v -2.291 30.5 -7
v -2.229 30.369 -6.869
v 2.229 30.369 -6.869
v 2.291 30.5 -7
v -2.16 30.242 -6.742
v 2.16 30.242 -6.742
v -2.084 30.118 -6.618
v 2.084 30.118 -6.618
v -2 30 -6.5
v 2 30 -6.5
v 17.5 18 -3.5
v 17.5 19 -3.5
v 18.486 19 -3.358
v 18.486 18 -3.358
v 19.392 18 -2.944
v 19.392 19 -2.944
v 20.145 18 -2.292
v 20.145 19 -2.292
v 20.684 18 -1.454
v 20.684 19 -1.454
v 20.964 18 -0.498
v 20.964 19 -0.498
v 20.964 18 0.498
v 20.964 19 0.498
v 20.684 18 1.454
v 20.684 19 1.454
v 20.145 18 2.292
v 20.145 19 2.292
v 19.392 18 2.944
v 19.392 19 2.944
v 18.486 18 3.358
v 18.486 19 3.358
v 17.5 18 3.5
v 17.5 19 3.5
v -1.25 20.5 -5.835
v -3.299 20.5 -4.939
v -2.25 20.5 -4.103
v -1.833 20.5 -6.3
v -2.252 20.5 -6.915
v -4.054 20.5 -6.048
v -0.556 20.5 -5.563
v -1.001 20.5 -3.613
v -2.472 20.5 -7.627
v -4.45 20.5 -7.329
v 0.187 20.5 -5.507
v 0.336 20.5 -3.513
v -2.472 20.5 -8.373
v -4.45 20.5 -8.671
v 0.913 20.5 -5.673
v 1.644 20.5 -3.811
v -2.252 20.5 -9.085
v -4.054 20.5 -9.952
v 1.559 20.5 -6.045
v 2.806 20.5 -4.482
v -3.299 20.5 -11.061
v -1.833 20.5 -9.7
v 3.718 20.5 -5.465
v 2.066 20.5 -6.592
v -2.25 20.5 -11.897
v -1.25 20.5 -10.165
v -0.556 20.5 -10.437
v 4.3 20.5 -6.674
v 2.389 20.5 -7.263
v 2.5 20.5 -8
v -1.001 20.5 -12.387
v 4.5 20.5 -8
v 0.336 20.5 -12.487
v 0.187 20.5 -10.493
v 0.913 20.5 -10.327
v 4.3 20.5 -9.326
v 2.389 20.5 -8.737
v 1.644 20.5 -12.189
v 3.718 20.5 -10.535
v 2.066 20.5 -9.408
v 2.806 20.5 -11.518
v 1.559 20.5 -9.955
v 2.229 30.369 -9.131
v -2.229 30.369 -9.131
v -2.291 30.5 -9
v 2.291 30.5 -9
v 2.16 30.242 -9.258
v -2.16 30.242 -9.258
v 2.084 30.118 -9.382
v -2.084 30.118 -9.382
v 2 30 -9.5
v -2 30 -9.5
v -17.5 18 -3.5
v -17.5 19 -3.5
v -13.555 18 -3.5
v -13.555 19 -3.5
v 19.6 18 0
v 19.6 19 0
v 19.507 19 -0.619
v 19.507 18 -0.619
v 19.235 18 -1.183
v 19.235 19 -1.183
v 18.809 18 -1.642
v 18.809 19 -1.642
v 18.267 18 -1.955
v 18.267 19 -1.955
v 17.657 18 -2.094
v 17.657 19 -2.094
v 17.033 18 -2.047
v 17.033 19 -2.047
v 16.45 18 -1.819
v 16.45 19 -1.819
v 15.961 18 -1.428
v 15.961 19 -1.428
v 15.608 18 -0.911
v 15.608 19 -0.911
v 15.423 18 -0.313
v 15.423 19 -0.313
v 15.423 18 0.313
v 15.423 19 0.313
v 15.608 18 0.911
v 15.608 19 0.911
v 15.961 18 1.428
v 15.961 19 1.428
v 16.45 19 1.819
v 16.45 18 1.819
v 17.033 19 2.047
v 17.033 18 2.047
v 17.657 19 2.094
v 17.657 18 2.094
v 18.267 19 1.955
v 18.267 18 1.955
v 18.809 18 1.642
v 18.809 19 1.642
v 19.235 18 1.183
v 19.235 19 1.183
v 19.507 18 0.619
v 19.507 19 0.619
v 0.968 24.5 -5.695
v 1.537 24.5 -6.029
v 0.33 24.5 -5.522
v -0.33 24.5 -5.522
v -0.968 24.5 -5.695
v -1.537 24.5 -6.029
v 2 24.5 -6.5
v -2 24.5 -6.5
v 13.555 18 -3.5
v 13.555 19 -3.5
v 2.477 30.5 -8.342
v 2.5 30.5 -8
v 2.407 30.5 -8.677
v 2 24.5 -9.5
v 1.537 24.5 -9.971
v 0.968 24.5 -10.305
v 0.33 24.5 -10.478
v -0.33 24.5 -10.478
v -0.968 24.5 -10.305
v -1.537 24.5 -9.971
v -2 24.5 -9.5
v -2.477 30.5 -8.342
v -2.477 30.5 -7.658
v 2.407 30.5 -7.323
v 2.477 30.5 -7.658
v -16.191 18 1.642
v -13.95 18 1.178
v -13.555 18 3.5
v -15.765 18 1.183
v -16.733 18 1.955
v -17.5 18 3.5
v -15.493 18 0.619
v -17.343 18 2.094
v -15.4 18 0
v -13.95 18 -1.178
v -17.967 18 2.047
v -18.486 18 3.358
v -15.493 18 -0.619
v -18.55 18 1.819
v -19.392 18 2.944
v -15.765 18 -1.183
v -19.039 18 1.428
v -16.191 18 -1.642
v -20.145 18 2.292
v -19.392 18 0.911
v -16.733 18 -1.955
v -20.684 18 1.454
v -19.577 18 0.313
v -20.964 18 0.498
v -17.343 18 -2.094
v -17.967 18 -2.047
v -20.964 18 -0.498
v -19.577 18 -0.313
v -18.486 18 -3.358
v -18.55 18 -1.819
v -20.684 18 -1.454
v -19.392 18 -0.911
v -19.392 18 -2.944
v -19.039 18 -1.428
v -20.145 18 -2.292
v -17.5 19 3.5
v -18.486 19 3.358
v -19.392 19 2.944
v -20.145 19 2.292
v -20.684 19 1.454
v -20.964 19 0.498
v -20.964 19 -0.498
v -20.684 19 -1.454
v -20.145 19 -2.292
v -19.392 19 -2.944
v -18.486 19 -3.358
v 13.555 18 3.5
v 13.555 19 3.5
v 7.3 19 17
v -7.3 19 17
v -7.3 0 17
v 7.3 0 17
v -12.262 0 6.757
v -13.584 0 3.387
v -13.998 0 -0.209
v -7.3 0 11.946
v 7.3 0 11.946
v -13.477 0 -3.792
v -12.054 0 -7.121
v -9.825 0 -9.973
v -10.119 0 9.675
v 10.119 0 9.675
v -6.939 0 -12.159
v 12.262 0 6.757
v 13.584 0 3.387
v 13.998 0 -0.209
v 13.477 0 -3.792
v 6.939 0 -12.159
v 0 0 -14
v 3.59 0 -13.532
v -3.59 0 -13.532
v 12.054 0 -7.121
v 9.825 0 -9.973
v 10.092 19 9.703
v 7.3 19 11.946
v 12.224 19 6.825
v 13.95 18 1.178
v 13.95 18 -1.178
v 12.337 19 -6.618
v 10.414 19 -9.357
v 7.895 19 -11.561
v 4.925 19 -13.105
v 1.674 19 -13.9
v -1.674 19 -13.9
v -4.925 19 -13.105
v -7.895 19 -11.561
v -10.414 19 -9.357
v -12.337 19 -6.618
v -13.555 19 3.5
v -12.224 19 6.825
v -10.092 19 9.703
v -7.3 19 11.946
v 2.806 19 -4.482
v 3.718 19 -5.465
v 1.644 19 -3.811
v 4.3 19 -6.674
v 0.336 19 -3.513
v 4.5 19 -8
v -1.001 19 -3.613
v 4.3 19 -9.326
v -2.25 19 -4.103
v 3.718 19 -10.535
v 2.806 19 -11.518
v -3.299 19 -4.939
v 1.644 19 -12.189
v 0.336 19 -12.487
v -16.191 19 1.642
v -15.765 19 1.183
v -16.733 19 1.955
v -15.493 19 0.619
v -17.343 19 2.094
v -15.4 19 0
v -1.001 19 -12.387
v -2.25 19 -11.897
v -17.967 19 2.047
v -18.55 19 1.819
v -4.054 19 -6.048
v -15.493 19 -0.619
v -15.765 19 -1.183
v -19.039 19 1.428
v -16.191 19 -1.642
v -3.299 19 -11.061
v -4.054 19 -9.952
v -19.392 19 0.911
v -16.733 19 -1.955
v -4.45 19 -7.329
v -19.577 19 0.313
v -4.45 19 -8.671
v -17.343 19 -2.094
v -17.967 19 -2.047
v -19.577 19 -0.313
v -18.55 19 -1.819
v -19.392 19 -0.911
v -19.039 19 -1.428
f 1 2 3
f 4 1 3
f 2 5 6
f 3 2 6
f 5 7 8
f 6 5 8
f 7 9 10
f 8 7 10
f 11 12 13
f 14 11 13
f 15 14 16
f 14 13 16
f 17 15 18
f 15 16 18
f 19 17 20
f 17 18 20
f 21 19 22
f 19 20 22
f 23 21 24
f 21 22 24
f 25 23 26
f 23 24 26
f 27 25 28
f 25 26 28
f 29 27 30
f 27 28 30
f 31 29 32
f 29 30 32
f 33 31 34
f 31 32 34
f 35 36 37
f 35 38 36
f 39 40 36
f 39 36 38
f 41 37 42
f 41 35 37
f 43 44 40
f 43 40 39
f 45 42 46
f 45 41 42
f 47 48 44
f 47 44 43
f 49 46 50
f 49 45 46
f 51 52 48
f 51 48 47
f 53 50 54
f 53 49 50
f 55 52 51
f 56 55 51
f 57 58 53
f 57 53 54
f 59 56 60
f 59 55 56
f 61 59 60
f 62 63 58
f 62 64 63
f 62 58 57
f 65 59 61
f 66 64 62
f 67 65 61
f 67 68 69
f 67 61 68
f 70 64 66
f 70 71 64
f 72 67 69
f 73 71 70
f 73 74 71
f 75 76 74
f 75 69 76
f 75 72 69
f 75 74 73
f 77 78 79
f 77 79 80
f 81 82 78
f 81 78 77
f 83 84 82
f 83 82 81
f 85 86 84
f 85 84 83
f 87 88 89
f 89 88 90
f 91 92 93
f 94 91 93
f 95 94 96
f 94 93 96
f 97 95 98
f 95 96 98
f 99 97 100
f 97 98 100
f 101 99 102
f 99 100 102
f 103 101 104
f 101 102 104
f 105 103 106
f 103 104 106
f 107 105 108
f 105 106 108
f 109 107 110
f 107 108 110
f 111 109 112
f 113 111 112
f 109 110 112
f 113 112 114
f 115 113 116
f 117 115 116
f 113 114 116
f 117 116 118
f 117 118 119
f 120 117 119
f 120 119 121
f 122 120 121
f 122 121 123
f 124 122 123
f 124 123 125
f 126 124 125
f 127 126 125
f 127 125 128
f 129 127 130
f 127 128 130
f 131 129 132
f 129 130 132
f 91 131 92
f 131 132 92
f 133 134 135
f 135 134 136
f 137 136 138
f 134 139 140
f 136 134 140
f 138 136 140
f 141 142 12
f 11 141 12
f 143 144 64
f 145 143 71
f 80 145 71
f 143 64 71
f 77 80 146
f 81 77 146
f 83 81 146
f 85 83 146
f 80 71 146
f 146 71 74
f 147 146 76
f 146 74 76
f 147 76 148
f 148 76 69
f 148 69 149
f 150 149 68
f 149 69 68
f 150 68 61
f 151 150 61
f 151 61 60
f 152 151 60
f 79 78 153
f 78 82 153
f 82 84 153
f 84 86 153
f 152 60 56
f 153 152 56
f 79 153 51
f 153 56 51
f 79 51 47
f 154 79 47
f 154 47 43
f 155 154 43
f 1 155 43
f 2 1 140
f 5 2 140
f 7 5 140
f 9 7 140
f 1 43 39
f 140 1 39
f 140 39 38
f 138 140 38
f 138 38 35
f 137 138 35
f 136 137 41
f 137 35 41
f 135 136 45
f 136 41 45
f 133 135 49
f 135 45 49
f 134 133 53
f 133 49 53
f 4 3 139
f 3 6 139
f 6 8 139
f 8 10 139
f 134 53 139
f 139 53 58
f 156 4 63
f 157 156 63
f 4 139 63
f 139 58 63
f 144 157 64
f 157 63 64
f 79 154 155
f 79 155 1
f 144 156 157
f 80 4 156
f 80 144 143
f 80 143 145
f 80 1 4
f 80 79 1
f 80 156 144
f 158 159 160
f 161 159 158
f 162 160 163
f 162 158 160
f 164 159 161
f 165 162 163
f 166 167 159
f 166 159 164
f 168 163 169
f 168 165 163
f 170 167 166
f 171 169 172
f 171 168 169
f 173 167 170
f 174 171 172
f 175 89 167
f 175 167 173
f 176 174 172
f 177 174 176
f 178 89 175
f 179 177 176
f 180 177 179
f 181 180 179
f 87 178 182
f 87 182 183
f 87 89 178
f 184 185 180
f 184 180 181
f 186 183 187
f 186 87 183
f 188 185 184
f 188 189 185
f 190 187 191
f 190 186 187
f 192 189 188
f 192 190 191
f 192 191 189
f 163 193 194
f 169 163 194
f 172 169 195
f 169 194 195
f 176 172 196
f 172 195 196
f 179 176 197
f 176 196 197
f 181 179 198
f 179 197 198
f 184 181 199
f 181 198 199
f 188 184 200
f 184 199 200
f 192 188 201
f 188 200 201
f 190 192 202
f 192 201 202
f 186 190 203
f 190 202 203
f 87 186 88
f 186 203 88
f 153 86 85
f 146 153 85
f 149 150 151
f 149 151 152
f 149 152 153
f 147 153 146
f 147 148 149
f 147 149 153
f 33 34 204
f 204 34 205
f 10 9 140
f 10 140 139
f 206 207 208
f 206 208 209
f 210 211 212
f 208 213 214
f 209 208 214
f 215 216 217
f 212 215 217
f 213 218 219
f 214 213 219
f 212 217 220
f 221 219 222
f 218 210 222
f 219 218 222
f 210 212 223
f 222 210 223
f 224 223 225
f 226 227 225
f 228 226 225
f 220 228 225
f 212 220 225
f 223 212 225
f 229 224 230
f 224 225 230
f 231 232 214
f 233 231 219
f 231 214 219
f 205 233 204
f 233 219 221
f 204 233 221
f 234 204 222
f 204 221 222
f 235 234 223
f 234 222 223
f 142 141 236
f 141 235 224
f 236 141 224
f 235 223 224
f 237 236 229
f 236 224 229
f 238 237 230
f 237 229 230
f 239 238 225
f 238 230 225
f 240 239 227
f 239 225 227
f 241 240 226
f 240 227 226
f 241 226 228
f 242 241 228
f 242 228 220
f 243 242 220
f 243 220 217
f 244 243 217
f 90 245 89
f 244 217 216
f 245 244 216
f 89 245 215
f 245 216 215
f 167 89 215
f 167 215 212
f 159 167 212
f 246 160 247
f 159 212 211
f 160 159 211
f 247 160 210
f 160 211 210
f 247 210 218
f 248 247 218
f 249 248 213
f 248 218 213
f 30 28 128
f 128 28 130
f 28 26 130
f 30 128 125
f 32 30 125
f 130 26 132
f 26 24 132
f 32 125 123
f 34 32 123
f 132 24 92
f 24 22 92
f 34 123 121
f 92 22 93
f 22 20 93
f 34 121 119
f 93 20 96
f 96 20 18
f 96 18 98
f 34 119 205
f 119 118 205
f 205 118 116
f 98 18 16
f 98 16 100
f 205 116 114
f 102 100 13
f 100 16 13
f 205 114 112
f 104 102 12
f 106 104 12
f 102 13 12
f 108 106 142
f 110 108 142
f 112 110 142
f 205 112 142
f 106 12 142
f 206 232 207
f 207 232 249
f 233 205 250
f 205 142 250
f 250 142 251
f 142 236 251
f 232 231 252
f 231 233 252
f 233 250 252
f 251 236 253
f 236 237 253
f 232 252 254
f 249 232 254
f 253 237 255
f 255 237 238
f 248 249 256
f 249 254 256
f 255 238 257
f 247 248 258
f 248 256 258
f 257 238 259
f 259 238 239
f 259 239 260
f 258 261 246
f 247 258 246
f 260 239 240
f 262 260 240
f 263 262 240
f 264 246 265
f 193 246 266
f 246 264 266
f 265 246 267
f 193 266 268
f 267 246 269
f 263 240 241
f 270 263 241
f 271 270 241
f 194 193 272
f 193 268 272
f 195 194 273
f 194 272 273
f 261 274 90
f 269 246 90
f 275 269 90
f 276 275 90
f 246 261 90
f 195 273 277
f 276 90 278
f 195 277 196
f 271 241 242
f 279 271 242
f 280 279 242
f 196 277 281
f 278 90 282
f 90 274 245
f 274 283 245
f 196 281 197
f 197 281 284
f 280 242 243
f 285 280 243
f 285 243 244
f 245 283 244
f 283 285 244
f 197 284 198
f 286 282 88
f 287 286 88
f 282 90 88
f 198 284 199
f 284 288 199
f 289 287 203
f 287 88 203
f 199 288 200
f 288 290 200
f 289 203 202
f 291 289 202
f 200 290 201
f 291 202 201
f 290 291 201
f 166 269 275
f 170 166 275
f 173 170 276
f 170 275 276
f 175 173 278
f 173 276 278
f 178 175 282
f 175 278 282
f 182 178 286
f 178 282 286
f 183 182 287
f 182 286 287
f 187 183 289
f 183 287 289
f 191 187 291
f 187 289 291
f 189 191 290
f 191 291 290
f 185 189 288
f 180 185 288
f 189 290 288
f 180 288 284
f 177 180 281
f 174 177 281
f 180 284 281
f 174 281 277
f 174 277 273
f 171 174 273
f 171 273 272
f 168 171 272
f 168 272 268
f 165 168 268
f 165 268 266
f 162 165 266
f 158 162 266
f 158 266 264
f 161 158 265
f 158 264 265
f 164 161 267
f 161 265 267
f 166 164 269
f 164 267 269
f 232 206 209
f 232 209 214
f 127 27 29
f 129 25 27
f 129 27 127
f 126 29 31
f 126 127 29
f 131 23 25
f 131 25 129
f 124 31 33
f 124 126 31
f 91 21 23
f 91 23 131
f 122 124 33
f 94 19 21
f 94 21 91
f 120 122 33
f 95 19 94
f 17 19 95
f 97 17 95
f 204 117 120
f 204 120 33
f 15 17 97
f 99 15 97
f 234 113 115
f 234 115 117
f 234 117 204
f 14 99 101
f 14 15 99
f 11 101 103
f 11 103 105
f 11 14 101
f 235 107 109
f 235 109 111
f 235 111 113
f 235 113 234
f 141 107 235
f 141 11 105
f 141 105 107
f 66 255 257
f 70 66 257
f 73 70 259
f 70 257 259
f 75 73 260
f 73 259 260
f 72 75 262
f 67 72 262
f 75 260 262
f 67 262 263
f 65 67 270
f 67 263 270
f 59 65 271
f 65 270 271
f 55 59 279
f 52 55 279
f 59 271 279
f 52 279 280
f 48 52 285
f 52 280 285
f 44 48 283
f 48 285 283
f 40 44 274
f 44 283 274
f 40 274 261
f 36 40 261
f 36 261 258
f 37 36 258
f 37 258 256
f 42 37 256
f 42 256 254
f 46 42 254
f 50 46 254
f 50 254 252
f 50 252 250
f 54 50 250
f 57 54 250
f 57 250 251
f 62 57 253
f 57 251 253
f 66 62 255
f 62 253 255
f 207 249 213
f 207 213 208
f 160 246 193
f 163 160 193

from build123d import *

# Parameters (mm, degrees)
SKETCH1_R           = 14
BOSS_EXTRUDE1_DEPTH = 19
SKETCH2_R           = 2.1
BOSS_EXTRUDE2_DEPTH = 1
SKETCH3_R           = 4.5
BOSS_EXTRUDE3_DEPTH = 1.5
SKETCH4_R           = 2.5
BOSS_EXTRUDE4_DEPTH = 10
CUT_EXTRUDE1_DEPTH  = 6
CHAMFER1_SIZE       = 0.5
BOSS_EXTRUDE5_DEPTH = 19


with BuildPart() as part:
    # Sketch1 → Boss-Extrude1 (new body)
    with BuildSketch(Plane(origin=(0, 0, 0), x_dir=(1, 0, 0), z_dir=(0, 1, 0))):
        Circle(SKETCH1_R)
    extrude(amount=BOSS_EXTRUDE1_DEPTH)

    # Sketch2 → Boss-Extrude2 (add)
    with BuildSketch(Plane(origin=(0, 19, 0), x_dir=(1, 0, 0), z_dir=(0, 1, 0))):
        with BuildLine():
            Line((-17.5, 3.5), (-13.555441712, 3.5))
            ThreePointArc((-13.555441712, 3.5), (-14, 0), (-13.555441712, -3.5))
            Line((-13.555441712, -3.5), (-17.5, -3.5))
            ThreePointArc((-17.5, -3.5), (-21, 0), (-17.5, 3.5))
        make_face()
        with Locations((-17.5, 0)):
            Circle(SKETCH2_R, mode=Mode.SUBTRACT)
        with BuildLine():
            Line((17.5, -3.5), (13.555441712, -3.5))
            ThreePointArc((13.555441712, -3.5), (14, 0), (13.555441712, 3.5))
            Line((13.555441712, 3.5), (17.5, 3.5))
            ThreePointArc((17.5, 3.5), (21, 0), (17.5, -3.5))
        make_face()
        with Locations((17.5, 0)):
            Circle(SKETCH2_R, mode=Mode.SUBTRACT)
    extrude(amount=-BOSS_EXTRUDE2_DEPTH)

    # Sketch3 → Boss-Extrude3 (add)
    with BuildSketch(Plane(origin=(0, 19, 0), x_dir=(1, 0, 0), z_dir=(0, 1, 0))):
        with Locations((0, 8)):
            Circle(SKETCH3_R)
    extrude(amount=BOSS_EXTRUDE3_DEPTH)

    # Sketch4 → Boss-Extrude4 (add)
    with BuildSketch(Plane(origin=(0, 20.5, 0), x_dir=(1, 0, 0), z_dir=(0, 1, 0))):
        with Locations((0, 8)):
            Circle(SKETCH4_R)
    extrude(amount=BOSS_EXTRUDE4_DEPTH)

    # Sketch5 → Cut-Extrude1 (cut)
    with BuildSketch(Plane(origin=(0, 30.5, 0), x_dir=(1, 0, 0), z_dir=(0, 1, 0))):
        with BuildLine():
            Line((-2, 9.5), (2, 9.5))
            ThreePointArc((2, 9.5), (0, 10.5), (-2, 9.5))
        make_face()
        with BuildLine():
            Line((-2, 6.5), (2, 6.5))
            ThreePointArc((2, 6.5), (0, 5.5), (-2, 6.5))
        make_face()
    extrude(amount=-CUT_EXTRUDE1_DEPTH, mode=Mode.SUBTRACT)

    # Chamfer1
    chamfer1_edges = [part.edges().sort_by_distance(p)[0] for p in [
        (0, 30.5, -9.5),
        (0, 30.5, -6.5),
    ]]
    chamfer(chamfer1_edges, length=CHAMFER1_SIZE)

    # Sketch6 → Boss-Extrude5 (add)
    with BuildSketch(Plane(origin=(0, 19, 0), x_dir=(1, 0, 0), z_dir=(0, 1, 0))):
        with BuildLine():
            Line((-7.3, -17), (7.3, -17))
            Line((7.3, -17), (7.3, -11.94612908))
            ThreePointArc((7.3, -11.94612908), (0, -14), (-7.3, -11.94612908))
            Line((-7.3, -11.94612908), (-7.3, -17))
        make_face()
    extrude(amount=-BOSS_EXTRUDE5_DEPTH)


solid = part.part
